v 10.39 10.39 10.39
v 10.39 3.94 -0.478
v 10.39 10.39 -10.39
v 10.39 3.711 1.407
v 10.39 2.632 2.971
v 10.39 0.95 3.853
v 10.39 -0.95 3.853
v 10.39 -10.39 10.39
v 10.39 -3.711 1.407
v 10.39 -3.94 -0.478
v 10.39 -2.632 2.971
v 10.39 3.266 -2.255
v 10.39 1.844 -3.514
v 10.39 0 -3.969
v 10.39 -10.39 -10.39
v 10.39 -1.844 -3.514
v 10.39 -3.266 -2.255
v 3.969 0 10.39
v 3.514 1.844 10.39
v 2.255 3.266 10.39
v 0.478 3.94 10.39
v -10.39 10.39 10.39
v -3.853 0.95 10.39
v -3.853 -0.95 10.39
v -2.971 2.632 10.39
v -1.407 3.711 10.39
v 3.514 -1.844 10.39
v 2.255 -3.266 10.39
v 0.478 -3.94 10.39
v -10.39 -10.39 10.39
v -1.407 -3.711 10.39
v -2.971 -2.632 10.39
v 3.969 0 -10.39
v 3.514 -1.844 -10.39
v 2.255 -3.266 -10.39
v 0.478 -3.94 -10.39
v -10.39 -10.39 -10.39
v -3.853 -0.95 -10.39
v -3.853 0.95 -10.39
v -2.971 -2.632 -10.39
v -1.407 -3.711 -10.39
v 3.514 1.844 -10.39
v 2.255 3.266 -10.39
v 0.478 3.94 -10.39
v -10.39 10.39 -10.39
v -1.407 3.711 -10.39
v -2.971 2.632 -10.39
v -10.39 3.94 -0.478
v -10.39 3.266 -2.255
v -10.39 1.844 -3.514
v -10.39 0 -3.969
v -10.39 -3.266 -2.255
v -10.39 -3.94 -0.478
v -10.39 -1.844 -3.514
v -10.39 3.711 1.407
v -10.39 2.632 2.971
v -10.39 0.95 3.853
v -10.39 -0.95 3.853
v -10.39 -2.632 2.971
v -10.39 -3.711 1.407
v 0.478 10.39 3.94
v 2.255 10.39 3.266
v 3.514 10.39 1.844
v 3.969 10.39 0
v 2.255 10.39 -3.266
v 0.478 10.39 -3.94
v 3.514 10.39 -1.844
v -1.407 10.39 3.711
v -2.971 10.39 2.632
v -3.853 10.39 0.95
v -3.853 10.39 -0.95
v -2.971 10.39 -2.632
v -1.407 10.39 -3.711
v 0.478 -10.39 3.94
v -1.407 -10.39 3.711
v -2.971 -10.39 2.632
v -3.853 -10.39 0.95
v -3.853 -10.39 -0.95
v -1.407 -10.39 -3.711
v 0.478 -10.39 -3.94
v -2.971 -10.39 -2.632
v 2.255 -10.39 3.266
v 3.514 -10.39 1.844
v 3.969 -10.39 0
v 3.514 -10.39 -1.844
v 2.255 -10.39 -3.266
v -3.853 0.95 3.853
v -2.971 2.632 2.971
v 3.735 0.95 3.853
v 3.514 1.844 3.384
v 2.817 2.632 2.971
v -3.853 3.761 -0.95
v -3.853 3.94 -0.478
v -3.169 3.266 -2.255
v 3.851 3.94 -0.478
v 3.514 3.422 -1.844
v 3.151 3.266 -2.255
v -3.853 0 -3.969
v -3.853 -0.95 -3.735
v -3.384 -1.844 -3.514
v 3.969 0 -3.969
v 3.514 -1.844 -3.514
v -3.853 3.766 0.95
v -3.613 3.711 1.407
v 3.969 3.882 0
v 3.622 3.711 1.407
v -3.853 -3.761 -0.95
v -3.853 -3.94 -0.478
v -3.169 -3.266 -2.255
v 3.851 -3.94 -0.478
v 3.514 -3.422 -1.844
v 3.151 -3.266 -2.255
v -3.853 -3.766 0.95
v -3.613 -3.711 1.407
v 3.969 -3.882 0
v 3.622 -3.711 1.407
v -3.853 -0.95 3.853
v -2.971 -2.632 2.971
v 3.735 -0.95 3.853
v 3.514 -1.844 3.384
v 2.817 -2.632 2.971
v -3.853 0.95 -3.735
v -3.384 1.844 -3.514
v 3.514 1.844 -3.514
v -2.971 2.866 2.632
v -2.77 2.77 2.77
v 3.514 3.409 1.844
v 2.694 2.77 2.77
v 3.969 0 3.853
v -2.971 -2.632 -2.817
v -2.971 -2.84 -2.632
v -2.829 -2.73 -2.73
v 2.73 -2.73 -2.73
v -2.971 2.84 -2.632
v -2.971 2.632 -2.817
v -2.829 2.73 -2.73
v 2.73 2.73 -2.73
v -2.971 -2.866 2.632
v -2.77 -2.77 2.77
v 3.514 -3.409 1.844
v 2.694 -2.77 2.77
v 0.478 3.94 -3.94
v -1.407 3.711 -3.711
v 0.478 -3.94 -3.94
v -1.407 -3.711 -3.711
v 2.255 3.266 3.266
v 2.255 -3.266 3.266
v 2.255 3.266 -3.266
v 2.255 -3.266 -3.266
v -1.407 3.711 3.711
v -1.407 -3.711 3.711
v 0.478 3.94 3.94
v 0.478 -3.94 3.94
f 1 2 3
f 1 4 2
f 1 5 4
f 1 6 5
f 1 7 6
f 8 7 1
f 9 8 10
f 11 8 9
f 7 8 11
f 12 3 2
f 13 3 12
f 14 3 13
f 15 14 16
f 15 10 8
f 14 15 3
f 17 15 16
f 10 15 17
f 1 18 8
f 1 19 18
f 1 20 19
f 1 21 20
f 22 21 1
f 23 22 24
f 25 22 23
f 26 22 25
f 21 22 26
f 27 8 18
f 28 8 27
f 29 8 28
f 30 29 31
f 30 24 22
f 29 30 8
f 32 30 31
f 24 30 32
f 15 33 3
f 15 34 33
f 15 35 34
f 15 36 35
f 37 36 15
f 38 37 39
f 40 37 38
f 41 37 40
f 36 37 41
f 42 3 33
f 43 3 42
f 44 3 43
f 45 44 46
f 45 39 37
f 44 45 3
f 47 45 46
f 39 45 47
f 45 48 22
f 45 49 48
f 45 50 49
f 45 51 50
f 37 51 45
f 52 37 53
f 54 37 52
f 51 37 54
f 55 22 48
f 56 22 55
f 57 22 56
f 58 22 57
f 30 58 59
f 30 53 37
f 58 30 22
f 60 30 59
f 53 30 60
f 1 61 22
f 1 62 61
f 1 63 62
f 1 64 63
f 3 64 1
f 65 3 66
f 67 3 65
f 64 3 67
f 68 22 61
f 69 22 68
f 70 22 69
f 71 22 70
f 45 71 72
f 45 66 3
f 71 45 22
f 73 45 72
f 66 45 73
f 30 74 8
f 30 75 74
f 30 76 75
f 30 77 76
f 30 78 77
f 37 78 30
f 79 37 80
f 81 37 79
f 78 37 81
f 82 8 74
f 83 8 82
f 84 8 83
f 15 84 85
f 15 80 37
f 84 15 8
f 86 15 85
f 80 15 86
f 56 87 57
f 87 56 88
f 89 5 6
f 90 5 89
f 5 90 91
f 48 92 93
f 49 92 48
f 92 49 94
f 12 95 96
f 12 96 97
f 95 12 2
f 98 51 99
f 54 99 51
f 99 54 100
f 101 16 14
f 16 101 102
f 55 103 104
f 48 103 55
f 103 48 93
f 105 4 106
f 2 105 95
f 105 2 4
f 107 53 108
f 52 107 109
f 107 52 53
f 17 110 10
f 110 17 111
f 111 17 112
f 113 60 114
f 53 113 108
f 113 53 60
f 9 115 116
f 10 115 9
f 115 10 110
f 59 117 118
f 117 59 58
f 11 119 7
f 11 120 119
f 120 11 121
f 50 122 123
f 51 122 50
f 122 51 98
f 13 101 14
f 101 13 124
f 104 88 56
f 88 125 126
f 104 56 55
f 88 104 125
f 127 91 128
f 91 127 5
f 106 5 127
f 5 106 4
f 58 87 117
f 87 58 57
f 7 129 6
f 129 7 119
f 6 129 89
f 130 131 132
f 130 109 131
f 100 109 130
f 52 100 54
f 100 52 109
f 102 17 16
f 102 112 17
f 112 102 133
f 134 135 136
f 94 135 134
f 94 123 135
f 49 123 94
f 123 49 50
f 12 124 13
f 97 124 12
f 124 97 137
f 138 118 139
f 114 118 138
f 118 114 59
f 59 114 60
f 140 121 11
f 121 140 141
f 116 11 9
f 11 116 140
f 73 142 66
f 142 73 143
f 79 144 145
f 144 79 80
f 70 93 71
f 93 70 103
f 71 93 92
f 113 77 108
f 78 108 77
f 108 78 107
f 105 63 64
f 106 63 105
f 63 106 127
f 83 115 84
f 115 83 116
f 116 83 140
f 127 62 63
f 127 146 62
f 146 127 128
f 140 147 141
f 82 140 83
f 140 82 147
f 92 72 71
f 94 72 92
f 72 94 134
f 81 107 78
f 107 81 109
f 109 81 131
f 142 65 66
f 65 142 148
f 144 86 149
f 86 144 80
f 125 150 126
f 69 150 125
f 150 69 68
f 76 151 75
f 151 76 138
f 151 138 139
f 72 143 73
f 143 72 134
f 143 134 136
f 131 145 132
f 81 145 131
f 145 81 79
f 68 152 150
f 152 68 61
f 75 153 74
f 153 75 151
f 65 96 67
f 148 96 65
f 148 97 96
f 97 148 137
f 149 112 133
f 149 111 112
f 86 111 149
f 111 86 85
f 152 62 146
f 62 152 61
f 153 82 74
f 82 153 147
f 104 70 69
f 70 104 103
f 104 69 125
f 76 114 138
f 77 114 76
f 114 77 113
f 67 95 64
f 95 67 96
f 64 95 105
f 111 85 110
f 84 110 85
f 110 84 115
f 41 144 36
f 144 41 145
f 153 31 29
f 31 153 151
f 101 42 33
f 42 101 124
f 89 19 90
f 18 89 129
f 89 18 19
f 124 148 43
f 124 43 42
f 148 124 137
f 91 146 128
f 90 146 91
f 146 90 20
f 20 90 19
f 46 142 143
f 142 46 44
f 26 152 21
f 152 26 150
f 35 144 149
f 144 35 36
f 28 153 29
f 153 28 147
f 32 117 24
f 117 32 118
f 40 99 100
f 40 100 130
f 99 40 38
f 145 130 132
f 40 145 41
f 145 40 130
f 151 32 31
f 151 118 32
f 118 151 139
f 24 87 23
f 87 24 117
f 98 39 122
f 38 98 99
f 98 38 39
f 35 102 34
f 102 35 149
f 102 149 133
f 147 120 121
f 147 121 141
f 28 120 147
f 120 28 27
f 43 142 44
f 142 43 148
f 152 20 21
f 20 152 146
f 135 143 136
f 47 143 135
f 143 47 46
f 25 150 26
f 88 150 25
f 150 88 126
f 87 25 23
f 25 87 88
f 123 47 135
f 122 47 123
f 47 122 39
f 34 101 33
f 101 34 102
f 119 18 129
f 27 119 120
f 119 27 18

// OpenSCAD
// A default set of sizes 
goldenratio = 1.61803399;
joinfactor = 0.25;

IR = 5/16/2*25.4; // Inner radius of connector
OR = (IR * goldenratio)*goldenratio; // Outer radius of connector
Length = OR*2; // Length of connector

quarterinch = 1/4 * 25.4; 
eighthinch = 1/8 * 25.4;

//OuterSquareInnerCylinder(22, IR, OR);
//cubevertexround(Radius, Length, IR, OR, Depth);
//cubevertexsquare(Length, IR, OR, Depth);
//cubevertexsquarestack(Length, IR, OR, Depth);
//cubevertexsquarestackthru(Length, IR, OR, Depth);
//cubevertexsquarethru(Length, IR, OR, Depth);
//elbowriser(Length, IR, OR);
cubevertex(Length, IR);

module cubevertex(side, IR)
{
	difference()
	{
		cube(size=[side, side, side], center=true);

		// along  x-axis
		rotate([0, 90, 0])
		cylinder(r=IR, h=side+joinfactor*2, center=true);

		// along y-axis
		rotate([90, 0, 0])
		cylinder(r=IR, h=side+joinfactor*2, center=true);

		// Along z-axis
		cylinder(r=IR, h=side+joinfactor*2, center=true);
	}
}
